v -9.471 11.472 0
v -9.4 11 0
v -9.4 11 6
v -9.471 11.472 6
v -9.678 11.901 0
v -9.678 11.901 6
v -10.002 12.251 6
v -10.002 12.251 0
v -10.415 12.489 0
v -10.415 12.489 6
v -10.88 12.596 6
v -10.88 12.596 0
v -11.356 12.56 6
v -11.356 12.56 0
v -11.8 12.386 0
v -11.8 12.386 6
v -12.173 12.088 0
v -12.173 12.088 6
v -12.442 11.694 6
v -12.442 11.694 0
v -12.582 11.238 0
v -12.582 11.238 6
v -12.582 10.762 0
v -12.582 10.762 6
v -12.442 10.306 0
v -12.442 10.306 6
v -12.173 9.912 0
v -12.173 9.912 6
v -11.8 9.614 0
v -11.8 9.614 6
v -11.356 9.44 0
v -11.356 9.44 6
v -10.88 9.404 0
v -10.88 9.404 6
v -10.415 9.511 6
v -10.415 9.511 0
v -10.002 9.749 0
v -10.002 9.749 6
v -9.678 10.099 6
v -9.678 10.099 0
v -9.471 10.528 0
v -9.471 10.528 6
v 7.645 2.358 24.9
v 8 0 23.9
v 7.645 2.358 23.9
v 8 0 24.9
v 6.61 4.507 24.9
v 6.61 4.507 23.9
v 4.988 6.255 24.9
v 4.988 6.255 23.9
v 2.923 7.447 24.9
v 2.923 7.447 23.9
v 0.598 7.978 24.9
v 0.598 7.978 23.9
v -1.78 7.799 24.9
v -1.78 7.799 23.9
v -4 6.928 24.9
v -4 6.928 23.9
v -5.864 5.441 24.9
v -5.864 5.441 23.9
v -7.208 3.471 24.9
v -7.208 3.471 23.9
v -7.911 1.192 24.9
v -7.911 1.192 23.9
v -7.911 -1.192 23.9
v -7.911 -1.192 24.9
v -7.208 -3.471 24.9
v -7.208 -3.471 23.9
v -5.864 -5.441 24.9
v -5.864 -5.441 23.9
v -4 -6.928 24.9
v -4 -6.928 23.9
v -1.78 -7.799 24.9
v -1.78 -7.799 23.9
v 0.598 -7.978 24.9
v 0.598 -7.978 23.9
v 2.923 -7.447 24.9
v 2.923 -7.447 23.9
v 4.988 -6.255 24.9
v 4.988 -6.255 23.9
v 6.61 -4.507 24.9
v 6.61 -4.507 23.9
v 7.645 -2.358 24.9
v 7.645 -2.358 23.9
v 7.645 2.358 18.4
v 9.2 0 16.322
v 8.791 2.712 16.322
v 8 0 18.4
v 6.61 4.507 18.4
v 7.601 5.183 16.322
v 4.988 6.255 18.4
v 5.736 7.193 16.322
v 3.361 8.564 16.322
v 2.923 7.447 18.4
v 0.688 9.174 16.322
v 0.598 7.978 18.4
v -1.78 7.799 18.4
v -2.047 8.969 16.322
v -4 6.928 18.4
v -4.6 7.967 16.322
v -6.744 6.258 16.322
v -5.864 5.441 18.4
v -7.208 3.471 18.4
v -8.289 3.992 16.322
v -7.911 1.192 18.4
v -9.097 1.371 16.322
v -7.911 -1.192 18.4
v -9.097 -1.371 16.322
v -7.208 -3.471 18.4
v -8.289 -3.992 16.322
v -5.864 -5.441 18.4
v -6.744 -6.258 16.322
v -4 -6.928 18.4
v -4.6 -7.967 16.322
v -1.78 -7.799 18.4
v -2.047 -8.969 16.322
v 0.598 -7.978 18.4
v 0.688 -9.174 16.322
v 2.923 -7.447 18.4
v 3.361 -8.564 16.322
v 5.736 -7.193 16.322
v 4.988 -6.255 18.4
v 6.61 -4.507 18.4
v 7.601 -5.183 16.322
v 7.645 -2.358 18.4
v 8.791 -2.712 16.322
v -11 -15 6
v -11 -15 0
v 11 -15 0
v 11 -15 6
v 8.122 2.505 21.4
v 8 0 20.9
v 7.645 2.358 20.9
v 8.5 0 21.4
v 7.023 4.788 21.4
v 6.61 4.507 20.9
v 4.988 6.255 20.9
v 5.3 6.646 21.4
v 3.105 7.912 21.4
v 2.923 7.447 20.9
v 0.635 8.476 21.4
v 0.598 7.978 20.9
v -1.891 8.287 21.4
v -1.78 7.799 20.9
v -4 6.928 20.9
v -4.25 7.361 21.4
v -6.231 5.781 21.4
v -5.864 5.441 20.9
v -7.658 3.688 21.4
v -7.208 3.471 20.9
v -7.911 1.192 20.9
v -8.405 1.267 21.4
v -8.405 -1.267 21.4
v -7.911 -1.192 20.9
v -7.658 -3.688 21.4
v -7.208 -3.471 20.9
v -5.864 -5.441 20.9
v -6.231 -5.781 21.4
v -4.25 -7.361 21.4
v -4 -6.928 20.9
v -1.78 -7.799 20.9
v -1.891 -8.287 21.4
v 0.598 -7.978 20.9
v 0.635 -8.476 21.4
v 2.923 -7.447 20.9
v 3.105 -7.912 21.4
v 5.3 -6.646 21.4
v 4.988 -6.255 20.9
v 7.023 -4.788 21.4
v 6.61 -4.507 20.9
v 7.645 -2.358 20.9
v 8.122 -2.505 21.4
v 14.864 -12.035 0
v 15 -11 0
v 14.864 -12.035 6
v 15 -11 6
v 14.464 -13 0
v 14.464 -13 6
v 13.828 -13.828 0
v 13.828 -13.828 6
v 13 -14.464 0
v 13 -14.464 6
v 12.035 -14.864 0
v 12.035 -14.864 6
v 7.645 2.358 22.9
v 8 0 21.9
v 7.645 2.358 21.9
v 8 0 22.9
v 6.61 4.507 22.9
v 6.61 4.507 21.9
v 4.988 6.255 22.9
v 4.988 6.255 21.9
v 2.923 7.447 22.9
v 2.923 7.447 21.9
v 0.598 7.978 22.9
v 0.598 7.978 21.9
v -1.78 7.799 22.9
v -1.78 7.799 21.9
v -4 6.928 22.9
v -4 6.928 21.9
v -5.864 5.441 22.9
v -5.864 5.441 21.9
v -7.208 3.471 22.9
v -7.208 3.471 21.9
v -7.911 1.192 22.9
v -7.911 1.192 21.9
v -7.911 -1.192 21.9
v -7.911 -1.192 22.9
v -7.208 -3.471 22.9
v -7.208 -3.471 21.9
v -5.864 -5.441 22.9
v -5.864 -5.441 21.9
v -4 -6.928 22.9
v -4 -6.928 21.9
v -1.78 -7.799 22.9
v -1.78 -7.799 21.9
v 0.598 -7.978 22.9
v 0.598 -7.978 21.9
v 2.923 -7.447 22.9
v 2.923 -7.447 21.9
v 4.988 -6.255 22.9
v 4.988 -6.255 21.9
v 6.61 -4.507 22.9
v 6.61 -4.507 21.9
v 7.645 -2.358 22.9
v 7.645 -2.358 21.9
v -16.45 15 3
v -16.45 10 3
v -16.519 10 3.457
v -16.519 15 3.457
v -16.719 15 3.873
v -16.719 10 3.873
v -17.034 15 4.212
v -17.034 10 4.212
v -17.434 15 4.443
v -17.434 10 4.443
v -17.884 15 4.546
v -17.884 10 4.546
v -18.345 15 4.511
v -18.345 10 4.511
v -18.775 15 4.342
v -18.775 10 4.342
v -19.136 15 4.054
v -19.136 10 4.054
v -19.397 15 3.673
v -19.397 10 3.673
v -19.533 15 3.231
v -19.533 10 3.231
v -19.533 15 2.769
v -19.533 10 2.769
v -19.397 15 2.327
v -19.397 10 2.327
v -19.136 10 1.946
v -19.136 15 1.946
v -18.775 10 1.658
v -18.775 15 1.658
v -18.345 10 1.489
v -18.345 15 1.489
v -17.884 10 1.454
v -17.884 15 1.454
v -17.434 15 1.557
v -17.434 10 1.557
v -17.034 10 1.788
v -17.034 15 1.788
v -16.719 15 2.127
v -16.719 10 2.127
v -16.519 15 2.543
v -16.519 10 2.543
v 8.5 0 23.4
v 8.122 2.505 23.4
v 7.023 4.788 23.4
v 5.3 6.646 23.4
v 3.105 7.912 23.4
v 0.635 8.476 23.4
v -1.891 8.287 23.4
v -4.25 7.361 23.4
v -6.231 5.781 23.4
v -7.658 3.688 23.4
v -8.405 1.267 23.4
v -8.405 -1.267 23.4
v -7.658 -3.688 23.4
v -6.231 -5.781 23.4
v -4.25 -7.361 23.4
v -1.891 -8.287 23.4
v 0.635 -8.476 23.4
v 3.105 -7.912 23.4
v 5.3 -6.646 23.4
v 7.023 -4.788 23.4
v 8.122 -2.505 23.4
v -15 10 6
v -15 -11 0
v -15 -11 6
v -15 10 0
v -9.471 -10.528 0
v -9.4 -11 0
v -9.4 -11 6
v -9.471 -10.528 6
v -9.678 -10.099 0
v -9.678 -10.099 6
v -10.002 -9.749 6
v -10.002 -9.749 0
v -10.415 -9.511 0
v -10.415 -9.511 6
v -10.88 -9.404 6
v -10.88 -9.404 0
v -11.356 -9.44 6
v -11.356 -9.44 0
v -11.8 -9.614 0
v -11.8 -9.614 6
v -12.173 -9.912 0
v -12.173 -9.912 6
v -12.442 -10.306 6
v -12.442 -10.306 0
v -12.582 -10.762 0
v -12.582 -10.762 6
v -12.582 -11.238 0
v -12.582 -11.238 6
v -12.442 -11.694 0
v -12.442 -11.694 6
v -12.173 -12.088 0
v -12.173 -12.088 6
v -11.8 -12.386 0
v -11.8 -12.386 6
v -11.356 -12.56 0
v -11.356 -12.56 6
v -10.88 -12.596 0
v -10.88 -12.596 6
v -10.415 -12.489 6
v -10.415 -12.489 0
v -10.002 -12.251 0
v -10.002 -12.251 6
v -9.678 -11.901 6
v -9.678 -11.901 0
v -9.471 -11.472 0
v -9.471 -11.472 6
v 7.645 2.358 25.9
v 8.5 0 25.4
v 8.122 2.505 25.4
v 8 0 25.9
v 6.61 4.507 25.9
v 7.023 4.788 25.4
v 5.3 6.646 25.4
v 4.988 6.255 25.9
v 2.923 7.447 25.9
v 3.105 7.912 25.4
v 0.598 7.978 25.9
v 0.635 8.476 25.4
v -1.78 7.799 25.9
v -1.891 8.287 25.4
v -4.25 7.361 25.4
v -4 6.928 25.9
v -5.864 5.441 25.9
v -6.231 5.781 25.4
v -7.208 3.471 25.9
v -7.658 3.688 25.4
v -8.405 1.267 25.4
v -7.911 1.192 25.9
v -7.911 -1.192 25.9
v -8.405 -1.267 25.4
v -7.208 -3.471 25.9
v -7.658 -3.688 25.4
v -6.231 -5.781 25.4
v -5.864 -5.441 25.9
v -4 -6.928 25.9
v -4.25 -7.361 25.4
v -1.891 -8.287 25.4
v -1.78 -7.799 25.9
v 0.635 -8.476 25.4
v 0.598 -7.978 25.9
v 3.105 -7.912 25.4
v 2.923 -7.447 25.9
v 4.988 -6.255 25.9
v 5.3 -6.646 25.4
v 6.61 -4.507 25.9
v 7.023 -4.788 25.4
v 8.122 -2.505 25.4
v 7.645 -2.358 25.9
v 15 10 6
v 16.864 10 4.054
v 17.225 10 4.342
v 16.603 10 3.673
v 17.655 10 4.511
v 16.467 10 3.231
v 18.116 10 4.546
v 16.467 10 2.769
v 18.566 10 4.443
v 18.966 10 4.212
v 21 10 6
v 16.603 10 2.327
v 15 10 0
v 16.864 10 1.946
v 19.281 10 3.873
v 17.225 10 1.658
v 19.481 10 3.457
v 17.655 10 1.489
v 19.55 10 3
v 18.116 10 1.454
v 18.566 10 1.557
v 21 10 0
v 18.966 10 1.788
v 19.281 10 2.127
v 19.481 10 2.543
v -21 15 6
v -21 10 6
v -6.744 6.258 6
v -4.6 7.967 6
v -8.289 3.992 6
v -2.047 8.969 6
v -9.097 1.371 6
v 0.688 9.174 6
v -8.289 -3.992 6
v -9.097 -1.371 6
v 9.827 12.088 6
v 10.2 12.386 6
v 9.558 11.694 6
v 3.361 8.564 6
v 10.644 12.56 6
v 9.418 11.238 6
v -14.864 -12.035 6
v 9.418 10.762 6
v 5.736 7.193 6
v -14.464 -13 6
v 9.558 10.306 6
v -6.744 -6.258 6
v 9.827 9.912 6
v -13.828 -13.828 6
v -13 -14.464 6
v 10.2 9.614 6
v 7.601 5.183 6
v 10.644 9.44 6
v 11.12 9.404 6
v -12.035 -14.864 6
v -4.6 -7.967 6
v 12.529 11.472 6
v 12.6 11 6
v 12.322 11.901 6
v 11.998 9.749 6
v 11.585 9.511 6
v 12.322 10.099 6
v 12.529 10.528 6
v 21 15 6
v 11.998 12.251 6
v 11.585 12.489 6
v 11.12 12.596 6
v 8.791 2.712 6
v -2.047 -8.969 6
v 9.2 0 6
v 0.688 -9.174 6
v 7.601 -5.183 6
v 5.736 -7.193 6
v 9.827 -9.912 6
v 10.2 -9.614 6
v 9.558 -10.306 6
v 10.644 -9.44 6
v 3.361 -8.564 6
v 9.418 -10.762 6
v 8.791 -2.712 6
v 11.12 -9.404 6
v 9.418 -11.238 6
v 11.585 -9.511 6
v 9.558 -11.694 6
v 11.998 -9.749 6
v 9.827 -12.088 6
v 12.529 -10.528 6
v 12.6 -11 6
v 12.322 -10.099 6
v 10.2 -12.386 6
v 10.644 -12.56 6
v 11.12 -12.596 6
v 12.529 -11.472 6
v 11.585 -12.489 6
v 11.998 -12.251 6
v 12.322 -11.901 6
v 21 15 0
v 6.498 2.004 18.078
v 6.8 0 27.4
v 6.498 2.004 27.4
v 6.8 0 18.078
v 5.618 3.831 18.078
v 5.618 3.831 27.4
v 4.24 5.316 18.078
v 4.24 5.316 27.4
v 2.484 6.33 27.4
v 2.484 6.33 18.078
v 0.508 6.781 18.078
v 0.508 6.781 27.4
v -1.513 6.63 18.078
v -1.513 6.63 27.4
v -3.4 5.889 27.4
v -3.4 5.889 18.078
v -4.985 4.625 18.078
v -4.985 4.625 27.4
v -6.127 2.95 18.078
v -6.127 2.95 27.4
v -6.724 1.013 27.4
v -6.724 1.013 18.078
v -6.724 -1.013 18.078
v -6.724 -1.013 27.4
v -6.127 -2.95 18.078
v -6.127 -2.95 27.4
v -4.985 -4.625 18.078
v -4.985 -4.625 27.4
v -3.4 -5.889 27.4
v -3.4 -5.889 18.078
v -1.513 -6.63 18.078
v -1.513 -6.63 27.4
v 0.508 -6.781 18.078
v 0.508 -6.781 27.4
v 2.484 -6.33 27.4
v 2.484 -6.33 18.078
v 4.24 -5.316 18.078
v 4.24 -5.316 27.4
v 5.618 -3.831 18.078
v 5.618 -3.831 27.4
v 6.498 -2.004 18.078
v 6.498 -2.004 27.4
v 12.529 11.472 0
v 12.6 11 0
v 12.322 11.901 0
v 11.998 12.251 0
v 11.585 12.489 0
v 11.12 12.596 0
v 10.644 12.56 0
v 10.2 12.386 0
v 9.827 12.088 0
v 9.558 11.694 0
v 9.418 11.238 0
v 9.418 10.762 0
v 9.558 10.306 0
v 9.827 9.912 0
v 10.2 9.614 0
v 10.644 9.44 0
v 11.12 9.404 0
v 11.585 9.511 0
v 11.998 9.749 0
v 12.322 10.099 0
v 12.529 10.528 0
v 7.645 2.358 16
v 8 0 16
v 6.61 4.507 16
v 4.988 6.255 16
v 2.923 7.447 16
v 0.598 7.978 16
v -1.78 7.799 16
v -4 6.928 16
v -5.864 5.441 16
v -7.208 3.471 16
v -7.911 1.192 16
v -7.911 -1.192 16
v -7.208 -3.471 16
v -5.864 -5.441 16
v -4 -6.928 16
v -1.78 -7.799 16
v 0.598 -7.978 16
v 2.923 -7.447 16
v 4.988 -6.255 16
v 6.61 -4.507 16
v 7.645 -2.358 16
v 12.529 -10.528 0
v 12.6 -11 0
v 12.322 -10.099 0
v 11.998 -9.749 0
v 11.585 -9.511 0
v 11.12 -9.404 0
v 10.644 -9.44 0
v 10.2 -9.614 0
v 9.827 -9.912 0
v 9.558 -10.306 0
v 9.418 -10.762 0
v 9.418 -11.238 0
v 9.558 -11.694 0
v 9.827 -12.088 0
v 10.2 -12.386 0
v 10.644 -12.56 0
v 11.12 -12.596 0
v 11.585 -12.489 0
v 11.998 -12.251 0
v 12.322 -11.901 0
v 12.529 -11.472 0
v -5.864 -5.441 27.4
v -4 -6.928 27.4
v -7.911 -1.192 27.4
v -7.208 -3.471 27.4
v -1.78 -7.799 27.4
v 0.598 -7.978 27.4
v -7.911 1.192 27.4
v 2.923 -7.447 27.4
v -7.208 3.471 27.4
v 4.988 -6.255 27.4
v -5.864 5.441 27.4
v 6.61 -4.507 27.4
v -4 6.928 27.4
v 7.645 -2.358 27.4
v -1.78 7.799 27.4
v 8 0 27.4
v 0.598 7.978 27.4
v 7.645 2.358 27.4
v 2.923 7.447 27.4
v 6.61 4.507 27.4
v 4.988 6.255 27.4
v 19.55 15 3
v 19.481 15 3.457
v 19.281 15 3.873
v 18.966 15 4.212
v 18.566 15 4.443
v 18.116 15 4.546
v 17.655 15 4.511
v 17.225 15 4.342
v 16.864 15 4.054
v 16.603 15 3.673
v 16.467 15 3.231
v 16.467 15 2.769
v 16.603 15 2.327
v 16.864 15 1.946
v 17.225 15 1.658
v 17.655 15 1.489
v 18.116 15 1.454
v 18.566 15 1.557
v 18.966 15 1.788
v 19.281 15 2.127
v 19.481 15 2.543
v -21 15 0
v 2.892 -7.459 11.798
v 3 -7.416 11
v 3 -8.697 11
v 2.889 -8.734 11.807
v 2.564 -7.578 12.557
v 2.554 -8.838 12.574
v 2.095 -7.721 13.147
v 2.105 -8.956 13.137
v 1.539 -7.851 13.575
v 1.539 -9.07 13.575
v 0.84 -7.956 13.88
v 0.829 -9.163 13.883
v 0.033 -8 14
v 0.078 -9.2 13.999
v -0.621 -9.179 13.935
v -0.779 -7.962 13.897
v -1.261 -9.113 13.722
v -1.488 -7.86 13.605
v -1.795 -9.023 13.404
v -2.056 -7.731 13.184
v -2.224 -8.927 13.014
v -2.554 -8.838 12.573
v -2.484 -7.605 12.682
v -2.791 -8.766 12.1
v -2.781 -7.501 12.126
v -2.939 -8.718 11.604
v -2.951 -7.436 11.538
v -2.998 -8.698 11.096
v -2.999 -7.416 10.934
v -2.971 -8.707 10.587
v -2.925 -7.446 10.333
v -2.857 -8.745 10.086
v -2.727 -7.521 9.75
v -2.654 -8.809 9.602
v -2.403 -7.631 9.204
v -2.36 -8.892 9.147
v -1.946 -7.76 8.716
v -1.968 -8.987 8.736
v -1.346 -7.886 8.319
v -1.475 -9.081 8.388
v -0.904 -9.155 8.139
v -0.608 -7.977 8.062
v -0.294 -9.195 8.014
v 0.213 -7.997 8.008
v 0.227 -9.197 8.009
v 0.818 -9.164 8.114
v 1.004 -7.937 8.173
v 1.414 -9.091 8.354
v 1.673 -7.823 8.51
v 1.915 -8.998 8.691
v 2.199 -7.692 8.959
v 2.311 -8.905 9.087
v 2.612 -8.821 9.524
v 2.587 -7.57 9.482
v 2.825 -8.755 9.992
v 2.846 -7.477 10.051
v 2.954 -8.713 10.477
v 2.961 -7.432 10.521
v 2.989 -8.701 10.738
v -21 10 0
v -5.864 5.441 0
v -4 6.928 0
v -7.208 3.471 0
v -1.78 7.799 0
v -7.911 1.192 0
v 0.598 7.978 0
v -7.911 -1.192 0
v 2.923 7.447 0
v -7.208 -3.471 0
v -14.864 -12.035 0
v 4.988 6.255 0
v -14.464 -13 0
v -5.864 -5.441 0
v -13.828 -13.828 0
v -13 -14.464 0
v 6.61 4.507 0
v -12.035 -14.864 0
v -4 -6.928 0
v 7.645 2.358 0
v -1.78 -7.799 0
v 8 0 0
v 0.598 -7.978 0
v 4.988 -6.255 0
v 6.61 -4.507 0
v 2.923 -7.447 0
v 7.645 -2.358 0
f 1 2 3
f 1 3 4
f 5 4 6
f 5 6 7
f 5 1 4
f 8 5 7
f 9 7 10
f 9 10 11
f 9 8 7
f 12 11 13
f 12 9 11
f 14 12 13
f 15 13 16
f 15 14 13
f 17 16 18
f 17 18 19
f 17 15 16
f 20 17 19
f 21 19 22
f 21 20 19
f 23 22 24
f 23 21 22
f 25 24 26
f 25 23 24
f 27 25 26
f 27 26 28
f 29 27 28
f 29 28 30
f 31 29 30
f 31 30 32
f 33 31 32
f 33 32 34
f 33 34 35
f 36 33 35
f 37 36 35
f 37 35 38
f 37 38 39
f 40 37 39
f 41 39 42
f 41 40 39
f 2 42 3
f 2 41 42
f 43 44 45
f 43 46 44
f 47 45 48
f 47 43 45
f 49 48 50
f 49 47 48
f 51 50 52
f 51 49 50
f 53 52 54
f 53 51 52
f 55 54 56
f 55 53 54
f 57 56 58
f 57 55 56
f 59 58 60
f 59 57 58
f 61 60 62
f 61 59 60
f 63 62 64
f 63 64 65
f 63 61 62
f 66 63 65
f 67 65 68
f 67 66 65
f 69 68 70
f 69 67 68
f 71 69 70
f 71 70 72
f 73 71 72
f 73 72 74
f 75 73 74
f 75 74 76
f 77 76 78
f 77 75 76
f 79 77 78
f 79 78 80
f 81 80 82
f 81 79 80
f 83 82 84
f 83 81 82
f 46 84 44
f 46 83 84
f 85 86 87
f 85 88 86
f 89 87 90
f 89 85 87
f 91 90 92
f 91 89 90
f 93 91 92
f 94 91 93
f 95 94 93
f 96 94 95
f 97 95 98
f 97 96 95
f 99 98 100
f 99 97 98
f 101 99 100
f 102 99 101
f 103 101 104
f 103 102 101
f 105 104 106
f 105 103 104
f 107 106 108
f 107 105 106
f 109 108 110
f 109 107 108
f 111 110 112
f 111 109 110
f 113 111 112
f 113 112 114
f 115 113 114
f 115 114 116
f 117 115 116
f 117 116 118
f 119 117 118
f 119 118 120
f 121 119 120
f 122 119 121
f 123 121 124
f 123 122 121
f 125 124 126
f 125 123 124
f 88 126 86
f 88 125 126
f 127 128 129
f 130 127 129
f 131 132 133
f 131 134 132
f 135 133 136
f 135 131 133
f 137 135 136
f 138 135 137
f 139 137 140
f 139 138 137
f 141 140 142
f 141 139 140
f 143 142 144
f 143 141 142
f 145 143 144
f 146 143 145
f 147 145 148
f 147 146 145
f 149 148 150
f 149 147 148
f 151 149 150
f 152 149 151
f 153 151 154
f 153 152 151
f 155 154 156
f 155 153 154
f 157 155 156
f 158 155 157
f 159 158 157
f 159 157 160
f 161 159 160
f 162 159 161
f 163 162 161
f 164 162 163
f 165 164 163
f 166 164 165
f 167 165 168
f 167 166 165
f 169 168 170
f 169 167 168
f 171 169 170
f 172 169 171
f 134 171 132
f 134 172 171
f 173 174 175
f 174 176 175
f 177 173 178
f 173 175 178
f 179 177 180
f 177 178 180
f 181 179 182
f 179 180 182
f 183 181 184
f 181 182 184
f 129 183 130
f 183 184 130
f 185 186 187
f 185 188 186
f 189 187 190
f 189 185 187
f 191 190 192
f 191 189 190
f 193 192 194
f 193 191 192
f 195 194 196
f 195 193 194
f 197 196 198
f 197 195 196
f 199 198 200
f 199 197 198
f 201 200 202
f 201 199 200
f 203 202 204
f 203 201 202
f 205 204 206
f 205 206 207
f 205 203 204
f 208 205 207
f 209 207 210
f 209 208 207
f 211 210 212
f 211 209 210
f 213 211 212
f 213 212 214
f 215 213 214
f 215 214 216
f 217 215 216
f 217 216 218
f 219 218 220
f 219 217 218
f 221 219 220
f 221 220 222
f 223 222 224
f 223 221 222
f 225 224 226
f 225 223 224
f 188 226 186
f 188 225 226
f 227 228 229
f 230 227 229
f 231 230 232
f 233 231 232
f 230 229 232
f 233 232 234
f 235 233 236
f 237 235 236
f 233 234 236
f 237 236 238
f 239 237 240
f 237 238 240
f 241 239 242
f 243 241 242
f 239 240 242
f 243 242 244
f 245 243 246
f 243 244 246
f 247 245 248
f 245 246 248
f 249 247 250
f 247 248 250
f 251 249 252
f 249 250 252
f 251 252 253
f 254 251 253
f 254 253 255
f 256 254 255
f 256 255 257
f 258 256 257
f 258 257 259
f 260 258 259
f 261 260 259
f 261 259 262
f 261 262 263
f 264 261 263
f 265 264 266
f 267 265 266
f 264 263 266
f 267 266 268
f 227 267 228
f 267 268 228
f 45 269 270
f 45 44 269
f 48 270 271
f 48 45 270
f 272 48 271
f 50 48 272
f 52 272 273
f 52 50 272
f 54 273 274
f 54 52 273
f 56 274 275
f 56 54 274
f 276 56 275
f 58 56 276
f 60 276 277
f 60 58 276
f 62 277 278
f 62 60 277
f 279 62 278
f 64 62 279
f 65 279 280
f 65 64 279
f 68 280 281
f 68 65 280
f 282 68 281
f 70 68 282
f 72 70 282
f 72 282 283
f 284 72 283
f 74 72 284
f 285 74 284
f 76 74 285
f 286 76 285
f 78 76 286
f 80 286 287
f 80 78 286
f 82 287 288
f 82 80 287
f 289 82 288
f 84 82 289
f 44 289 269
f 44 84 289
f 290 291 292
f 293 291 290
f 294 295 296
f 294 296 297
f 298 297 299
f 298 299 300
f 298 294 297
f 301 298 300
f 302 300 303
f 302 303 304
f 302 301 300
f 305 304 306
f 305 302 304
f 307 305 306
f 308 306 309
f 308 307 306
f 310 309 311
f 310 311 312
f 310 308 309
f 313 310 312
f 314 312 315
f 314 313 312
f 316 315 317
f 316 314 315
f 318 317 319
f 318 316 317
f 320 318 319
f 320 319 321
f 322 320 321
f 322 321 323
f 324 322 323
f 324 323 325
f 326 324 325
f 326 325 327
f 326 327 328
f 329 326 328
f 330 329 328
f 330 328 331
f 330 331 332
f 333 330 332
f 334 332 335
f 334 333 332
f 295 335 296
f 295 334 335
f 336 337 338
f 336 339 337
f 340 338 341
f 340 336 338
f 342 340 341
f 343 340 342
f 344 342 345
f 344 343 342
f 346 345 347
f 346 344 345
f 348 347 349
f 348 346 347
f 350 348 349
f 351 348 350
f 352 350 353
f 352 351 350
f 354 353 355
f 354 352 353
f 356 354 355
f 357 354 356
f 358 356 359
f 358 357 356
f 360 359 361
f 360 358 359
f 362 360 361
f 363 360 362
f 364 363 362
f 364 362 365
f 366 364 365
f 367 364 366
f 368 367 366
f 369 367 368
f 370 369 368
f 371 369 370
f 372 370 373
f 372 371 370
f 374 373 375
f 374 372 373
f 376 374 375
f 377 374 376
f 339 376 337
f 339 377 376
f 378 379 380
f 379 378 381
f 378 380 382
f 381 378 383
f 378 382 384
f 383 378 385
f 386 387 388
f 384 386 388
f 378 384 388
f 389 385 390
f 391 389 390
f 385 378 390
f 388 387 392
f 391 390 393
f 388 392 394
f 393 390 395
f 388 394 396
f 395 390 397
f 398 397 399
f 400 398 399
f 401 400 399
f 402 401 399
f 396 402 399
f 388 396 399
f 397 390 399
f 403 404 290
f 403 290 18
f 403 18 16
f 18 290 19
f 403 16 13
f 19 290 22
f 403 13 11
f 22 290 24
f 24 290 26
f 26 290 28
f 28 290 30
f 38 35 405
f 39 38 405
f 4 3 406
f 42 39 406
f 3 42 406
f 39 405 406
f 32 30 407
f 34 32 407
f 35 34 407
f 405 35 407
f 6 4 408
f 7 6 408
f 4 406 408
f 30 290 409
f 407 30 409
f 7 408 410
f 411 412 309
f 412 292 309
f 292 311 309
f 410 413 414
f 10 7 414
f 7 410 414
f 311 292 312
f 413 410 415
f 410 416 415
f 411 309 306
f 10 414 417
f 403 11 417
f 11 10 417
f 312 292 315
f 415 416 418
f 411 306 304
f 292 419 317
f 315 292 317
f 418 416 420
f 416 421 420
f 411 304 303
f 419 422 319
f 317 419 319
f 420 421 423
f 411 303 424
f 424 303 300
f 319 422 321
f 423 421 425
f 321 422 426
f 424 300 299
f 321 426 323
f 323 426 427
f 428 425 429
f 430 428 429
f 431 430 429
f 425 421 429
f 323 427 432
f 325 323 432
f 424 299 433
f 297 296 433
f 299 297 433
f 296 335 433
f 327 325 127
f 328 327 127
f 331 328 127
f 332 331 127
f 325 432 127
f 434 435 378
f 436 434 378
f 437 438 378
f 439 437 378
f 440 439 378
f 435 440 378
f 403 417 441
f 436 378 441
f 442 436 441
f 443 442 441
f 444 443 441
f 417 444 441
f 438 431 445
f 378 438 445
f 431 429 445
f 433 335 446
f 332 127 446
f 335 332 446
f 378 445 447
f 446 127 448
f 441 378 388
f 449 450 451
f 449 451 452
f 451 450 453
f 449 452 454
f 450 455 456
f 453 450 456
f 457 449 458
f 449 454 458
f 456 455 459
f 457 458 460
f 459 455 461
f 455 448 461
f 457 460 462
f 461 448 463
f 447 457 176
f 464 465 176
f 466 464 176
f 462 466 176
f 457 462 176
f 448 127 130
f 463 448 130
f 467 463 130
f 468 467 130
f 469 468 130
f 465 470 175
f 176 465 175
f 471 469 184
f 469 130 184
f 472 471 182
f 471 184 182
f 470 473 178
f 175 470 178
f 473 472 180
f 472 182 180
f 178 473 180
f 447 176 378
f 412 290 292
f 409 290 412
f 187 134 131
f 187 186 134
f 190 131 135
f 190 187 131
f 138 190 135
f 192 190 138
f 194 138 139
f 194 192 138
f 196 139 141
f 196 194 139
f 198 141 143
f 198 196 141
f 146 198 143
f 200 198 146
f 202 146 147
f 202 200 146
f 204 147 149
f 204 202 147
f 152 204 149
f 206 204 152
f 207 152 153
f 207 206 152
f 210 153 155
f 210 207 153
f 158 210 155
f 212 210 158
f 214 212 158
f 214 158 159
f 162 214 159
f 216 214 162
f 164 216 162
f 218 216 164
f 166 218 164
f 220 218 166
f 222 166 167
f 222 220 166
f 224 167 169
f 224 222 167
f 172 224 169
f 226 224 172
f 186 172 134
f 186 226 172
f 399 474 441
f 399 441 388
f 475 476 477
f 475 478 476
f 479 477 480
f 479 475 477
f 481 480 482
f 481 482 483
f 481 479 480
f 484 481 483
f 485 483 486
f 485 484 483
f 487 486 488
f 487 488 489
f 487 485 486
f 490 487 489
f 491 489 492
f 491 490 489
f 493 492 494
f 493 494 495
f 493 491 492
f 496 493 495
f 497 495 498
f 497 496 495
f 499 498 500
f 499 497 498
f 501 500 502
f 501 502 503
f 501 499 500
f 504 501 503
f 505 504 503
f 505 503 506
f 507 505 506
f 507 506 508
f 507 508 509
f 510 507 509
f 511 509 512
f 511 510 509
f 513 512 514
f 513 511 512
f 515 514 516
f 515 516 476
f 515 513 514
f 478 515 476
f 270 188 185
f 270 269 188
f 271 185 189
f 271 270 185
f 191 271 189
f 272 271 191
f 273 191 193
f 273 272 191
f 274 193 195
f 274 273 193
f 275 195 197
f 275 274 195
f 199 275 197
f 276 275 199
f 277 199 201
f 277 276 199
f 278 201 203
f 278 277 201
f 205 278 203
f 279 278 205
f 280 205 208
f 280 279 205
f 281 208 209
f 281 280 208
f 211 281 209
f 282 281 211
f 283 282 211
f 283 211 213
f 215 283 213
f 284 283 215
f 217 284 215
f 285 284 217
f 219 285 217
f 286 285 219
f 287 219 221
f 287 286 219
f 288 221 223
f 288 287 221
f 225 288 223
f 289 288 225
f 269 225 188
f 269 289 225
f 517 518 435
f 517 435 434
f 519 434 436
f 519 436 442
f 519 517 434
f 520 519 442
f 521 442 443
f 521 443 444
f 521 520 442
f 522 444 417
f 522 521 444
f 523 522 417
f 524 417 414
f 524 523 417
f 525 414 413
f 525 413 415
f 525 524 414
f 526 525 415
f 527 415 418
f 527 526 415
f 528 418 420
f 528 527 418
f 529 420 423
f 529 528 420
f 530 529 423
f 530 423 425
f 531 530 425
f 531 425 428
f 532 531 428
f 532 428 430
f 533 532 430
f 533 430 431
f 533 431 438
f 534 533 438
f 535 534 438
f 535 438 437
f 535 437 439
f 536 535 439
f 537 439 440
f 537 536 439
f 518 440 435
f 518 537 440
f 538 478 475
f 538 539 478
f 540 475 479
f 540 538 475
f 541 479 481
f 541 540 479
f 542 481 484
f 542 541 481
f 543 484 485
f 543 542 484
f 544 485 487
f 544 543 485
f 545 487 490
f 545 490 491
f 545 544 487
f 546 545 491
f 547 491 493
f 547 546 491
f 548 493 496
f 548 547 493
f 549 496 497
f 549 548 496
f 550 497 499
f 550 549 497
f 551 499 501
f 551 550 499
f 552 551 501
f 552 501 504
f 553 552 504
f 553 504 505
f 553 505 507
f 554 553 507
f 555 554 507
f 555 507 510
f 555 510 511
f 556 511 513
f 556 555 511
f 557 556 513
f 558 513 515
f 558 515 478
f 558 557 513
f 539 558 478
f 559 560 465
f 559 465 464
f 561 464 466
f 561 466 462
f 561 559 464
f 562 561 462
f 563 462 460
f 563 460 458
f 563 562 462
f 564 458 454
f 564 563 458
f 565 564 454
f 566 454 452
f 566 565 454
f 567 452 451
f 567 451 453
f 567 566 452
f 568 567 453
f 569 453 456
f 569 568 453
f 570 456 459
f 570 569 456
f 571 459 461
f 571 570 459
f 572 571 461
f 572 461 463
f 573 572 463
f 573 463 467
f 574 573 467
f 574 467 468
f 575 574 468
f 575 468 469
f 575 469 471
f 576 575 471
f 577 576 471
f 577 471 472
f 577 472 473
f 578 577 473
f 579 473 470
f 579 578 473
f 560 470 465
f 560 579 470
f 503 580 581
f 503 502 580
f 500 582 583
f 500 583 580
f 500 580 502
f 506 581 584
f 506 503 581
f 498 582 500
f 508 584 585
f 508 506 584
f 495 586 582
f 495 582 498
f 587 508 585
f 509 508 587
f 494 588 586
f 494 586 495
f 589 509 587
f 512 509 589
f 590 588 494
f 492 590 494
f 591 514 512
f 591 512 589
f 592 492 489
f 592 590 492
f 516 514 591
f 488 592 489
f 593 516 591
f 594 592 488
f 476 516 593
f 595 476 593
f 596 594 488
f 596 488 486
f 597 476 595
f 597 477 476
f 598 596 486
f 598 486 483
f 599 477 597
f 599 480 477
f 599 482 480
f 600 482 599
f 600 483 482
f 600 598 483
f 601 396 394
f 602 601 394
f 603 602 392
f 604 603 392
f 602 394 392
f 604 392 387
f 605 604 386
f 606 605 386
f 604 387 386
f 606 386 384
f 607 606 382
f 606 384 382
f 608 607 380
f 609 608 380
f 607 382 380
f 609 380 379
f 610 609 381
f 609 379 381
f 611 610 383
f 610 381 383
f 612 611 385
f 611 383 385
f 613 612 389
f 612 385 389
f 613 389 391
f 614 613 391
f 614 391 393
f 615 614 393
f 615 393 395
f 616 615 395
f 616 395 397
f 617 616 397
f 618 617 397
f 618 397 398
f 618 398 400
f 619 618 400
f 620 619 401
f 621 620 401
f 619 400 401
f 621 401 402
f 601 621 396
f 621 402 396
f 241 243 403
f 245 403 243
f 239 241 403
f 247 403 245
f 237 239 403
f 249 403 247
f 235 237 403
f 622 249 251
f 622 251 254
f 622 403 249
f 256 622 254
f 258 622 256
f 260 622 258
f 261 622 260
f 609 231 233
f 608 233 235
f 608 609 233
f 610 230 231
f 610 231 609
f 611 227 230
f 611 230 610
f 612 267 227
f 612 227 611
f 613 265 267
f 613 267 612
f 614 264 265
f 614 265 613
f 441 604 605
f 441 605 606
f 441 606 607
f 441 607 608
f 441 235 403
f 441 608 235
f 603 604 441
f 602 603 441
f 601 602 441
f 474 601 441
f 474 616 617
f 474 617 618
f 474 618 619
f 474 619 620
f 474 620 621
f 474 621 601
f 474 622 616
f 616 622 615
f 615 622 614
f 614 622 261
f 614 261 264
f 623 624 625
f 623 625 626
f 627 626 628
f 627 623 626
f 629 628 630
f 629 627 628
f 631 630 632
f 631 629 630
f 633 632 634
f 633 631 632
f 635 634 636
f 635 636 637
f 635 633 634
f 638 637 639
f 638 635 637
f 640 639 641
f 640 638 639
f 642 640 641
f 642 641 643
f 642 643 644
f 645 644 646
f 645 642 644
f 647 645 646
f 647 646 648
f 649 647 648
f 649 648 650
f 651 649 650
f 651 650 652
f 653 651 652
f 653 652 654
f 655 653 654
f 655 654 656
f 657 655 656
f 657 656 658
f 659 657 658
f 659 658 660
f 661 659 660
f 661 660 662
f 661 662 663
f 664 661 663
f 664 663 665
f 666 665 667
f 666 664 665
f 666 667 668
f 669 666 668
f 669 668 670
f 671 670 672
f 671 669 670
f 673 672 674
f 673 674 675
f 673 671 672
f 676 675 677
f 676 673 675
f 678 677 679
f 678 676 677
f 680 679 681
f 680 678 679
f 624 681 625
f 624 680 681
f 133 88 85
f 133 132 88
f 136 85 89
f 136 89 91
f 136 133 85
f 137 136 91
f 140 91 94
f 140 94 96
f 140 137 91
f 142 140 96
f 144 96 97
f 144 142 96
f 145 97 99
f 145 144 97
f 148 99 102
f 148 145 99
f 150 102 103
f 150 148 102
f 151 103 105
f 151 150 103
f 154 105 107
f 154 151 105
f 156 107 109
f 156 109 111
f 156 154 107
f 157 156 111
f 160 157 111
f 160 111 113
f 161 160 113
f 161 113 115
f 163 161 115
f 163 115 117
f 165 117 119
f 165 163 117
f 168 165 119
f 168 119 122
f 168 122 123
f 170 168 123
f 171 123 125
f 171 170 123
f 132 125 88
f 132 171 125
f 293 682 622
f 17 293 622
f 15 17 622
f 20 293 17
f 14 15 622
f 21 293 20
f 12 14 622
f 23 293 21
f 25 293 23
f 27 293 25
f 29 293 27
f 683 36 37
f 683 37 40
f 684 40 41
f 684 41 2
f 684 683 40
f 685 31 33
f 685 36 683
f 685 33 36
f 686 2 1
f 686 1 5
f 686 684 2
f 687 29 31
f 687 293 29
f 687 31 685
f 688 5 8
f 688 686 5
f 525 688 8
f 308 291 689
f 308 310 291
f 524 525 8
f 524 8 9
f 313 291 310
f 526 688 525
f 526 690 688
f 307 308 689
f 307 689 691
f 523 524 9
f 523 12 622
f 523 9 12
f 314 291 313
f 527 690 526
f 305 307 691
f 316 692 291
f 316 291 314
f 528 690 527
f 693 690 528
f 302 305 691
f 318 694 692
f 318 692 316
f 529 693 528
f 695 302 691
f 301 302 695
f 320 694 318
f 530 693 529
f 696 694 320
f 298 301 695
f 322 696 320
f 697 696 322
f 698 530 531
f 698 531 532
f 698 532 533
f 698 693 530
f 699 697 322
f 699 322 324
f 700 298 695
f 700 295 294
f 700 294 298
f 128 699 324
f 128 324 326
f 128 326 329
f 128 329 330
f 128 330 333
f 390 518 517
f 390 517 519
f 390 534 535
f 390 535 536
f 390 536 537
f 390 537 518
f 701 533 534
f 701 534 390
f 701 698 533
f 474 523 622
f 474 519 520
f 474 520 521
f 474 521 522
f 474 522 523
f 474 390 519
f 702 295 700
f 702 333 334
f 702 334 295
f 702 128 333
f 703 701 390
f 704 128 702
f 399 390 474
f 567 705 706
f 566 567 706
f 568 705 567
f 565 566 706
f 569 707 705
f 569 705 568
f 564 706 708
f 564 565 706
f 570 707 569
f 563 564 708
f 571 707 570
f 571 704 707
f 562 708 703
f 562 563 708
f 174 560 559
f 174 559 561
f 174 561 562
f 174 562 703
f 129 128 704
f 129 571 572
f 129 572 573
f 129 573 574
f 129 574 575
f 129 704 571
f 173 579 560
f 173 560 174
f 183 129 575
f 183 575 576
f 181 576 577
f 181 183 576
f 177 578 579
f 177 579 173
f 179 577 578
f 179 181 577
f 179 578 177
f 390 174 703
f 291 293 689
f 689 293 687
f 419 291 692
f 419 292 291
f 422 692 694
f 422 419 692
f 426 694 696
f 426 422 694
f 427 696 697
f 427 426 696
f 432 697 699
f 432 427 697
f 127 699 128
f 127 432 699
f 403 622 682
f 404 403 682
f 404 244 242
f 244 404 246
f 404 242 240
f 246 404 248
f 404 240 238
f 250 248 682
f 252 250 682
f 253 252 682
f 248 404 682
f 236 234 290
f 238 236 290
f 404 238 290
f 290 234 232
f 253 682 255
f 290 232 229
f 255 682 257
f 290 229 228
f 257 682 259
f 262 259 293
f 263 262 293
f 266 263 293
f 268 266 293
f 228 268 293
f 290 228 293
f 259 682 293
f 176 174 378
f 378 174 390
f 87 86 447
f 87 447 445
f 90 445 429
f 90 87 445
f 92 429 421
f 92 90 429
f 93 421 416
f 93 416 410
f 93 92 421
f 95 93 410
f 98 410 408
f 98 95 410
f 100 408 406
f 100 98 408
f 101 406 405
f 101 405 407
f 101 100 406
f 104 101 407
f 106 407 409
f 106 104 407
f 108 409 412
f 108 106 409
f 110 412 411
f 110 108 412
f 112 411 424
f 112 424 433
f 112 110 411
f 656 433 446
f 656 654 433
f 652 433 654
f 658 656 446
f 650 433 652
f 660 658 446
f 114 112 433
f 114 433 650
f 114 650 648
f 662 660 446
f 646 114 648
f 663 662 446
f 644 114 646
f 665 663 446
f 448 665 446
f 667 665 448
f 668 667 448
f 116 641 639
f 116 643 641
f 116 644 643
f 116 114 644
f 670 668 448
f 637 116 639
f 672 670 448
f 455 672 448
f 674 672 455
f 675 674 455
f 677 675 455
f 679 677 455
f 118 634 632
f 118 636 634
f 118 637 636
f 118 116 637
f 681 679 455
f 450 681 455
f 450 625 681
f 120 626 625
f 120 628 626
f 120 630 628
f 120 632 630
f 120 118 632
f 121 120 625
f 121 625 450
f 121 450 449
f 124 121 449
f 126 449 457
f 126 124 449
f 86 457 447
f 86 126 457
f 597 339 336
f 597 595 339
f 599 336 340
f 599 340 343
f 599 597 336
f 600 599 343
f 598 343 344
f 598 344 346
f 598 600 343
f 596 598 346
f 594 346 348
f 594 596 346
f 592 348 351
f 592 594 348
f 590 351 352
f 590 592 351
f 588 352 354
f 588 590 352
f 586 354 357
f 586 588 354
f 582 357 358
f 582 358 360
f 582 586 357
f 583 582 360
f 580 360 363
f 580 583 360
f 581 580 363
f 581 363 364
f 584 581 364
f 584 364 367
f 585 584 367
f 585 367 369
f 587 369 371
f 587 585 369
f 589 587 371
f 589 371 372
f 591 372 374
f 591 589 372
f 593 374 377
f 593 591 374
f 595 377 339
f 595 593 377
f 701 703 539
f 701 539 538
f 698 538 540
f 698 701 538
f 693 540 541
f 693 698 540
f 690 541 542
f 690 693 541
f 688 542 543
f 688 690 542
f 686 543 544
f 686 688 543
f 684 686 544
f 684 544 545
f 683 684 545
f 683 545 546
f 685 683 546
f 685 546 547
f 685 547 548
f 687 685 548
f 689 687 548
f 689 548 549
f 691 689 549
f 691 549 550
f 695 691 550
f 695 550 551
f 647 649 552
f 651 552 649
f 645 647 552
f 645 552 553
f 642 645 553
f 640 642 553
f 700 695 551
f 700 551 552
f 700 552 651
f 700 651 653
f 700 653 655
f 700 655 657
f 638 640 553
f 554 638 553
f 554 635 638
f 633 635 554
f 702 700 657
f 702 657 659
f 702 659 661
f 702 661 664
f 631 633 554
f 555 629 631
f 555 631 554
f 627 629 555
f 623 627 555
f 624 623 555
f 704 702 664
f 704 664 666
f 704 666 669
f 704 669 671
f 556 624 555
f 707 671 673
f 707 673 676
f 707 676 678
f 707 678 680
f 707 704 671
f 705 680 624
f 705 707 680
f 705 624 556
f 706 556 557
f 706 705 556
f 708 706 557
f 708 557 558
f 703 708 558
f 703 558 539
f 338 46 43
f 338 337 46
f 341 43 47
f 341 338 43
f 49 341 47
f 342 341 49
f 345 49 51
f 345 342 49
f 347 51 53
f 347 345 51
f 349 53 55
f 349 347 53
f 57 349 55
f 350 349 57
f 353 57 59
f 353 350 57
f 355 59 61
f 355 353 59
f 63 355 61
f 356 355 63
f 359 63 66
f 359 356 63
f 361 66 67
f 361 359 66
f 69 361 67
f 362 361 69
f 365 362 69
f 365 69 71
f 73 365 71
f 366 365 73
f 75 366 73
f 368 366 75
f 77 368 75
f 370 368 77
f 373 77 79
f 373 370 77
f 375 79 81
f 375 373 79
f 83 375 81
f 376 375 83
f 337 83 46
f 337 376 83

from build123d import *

# Parameters (mm, degrees)
SKETCH_W        = 30
SKETCH_H        = 30
SKETCH_R        = 8
SKETCH_R_2      = 1.6
PAD_DEPTH       = 6
SKETCH002_R     = 3
POCKET_DEPTH    = 15.001
COPYSKETCH003_W = 7
COPYSKETCH003_H = 5
PAD001_DEPTH    = 6
COPYSKETCH004_R = 1.55
POCKET001_DEPTH = 5
FILLET_R        = 4


with BuildPart() as part:
    # Sketch → Pad (new body)
    with BuildSketch(Plane.XY):
        Rectangle(SKETCH_W, SKETCH_H)
        Circle(SKETCH_R, mode=Mode.SUBTRACT)
        with Locations((-11, 11)):
            Circle(SKETCH_R_2, mode=Mode.SUBTRACT)
        with Locations((11, 11)):
            Circle(SKETCH_R_2, mode=Mode.SUBTRACT)
        with Locations((-11, -11)):
            Circle(SKETCH_R_2, mode=Mode.SUBTRACT)
        with Locations((11, -11)):
            Circle(SKETCH_R_2, mode=Mode.SUBTRACT)
    extrude(amount=PAD_DEPTH)

    # Sketch001 → Revolution (revolve)
    with BuildSketch(Plane.XZ):
        Polygon((9.2, 6), (9.2, 16.321539), (8, 18.4), (8, 20.9), (8.5, 21.4), (8, 21.9), (8, 22.9), (8.5, 23.4), (8, 23.9), (8, 24.9), (8.5, 25.4), (8, 25.9), (8, 27.4), (6.8, 27.4), (6.8, 18.078461), (8, 16), (8, 6), align=None)
    revolve(axis=Axis((0, 0, 0), (0, 0, 1)))

    # Sketch002 → Pocket (cut, through all)
    with BuildSketch(Plane.XZ):
        with Locations((0, 11)):
            Circle(SKETCH002_R)
    extrude(amount=POCKET_DEPTH, mode=Mode.SUBTRACT)

    # CopySketch003 → Pad001 (join)
    with BuildSketch(Plane(origin=(0, 0, 0), x_dir=(1, 0, 0), z_dir=(0, 0, -1))):
        with Locations((-17.5, -12.5)):
            Rectangle(COPYSKETCH003_W, COPYSKETCH003_H)
        with Locations((17.5, -12.5)):
            Rectangle(COPYSKETCH003_W, COPYSKETCH003_H)
    extrude(amount=-PAD001_DEPTH)

    # CopySketch004 → Pocket001 (cut)
    with BuildSketch(Plane.XZ.offset(-10)):
        with Locations((-18, 3)):
            Circle(COPYSKETCH004_R)
        with Locations((18, 3)):
            Circle(COPYSKETCH004_R)
    extrude(amount=-POCKET001_DEPTH, mode=Mode.SUBTRACT)

    # Fillet
    fillet_edges = [part.edges().sort_by_distance(p)[0] for p in [
        (-15, -15, 3),
        (15, -15, 3),
    ]]
    fillet(fillet_edges, radius=FILLET_R)


solid = part.part
